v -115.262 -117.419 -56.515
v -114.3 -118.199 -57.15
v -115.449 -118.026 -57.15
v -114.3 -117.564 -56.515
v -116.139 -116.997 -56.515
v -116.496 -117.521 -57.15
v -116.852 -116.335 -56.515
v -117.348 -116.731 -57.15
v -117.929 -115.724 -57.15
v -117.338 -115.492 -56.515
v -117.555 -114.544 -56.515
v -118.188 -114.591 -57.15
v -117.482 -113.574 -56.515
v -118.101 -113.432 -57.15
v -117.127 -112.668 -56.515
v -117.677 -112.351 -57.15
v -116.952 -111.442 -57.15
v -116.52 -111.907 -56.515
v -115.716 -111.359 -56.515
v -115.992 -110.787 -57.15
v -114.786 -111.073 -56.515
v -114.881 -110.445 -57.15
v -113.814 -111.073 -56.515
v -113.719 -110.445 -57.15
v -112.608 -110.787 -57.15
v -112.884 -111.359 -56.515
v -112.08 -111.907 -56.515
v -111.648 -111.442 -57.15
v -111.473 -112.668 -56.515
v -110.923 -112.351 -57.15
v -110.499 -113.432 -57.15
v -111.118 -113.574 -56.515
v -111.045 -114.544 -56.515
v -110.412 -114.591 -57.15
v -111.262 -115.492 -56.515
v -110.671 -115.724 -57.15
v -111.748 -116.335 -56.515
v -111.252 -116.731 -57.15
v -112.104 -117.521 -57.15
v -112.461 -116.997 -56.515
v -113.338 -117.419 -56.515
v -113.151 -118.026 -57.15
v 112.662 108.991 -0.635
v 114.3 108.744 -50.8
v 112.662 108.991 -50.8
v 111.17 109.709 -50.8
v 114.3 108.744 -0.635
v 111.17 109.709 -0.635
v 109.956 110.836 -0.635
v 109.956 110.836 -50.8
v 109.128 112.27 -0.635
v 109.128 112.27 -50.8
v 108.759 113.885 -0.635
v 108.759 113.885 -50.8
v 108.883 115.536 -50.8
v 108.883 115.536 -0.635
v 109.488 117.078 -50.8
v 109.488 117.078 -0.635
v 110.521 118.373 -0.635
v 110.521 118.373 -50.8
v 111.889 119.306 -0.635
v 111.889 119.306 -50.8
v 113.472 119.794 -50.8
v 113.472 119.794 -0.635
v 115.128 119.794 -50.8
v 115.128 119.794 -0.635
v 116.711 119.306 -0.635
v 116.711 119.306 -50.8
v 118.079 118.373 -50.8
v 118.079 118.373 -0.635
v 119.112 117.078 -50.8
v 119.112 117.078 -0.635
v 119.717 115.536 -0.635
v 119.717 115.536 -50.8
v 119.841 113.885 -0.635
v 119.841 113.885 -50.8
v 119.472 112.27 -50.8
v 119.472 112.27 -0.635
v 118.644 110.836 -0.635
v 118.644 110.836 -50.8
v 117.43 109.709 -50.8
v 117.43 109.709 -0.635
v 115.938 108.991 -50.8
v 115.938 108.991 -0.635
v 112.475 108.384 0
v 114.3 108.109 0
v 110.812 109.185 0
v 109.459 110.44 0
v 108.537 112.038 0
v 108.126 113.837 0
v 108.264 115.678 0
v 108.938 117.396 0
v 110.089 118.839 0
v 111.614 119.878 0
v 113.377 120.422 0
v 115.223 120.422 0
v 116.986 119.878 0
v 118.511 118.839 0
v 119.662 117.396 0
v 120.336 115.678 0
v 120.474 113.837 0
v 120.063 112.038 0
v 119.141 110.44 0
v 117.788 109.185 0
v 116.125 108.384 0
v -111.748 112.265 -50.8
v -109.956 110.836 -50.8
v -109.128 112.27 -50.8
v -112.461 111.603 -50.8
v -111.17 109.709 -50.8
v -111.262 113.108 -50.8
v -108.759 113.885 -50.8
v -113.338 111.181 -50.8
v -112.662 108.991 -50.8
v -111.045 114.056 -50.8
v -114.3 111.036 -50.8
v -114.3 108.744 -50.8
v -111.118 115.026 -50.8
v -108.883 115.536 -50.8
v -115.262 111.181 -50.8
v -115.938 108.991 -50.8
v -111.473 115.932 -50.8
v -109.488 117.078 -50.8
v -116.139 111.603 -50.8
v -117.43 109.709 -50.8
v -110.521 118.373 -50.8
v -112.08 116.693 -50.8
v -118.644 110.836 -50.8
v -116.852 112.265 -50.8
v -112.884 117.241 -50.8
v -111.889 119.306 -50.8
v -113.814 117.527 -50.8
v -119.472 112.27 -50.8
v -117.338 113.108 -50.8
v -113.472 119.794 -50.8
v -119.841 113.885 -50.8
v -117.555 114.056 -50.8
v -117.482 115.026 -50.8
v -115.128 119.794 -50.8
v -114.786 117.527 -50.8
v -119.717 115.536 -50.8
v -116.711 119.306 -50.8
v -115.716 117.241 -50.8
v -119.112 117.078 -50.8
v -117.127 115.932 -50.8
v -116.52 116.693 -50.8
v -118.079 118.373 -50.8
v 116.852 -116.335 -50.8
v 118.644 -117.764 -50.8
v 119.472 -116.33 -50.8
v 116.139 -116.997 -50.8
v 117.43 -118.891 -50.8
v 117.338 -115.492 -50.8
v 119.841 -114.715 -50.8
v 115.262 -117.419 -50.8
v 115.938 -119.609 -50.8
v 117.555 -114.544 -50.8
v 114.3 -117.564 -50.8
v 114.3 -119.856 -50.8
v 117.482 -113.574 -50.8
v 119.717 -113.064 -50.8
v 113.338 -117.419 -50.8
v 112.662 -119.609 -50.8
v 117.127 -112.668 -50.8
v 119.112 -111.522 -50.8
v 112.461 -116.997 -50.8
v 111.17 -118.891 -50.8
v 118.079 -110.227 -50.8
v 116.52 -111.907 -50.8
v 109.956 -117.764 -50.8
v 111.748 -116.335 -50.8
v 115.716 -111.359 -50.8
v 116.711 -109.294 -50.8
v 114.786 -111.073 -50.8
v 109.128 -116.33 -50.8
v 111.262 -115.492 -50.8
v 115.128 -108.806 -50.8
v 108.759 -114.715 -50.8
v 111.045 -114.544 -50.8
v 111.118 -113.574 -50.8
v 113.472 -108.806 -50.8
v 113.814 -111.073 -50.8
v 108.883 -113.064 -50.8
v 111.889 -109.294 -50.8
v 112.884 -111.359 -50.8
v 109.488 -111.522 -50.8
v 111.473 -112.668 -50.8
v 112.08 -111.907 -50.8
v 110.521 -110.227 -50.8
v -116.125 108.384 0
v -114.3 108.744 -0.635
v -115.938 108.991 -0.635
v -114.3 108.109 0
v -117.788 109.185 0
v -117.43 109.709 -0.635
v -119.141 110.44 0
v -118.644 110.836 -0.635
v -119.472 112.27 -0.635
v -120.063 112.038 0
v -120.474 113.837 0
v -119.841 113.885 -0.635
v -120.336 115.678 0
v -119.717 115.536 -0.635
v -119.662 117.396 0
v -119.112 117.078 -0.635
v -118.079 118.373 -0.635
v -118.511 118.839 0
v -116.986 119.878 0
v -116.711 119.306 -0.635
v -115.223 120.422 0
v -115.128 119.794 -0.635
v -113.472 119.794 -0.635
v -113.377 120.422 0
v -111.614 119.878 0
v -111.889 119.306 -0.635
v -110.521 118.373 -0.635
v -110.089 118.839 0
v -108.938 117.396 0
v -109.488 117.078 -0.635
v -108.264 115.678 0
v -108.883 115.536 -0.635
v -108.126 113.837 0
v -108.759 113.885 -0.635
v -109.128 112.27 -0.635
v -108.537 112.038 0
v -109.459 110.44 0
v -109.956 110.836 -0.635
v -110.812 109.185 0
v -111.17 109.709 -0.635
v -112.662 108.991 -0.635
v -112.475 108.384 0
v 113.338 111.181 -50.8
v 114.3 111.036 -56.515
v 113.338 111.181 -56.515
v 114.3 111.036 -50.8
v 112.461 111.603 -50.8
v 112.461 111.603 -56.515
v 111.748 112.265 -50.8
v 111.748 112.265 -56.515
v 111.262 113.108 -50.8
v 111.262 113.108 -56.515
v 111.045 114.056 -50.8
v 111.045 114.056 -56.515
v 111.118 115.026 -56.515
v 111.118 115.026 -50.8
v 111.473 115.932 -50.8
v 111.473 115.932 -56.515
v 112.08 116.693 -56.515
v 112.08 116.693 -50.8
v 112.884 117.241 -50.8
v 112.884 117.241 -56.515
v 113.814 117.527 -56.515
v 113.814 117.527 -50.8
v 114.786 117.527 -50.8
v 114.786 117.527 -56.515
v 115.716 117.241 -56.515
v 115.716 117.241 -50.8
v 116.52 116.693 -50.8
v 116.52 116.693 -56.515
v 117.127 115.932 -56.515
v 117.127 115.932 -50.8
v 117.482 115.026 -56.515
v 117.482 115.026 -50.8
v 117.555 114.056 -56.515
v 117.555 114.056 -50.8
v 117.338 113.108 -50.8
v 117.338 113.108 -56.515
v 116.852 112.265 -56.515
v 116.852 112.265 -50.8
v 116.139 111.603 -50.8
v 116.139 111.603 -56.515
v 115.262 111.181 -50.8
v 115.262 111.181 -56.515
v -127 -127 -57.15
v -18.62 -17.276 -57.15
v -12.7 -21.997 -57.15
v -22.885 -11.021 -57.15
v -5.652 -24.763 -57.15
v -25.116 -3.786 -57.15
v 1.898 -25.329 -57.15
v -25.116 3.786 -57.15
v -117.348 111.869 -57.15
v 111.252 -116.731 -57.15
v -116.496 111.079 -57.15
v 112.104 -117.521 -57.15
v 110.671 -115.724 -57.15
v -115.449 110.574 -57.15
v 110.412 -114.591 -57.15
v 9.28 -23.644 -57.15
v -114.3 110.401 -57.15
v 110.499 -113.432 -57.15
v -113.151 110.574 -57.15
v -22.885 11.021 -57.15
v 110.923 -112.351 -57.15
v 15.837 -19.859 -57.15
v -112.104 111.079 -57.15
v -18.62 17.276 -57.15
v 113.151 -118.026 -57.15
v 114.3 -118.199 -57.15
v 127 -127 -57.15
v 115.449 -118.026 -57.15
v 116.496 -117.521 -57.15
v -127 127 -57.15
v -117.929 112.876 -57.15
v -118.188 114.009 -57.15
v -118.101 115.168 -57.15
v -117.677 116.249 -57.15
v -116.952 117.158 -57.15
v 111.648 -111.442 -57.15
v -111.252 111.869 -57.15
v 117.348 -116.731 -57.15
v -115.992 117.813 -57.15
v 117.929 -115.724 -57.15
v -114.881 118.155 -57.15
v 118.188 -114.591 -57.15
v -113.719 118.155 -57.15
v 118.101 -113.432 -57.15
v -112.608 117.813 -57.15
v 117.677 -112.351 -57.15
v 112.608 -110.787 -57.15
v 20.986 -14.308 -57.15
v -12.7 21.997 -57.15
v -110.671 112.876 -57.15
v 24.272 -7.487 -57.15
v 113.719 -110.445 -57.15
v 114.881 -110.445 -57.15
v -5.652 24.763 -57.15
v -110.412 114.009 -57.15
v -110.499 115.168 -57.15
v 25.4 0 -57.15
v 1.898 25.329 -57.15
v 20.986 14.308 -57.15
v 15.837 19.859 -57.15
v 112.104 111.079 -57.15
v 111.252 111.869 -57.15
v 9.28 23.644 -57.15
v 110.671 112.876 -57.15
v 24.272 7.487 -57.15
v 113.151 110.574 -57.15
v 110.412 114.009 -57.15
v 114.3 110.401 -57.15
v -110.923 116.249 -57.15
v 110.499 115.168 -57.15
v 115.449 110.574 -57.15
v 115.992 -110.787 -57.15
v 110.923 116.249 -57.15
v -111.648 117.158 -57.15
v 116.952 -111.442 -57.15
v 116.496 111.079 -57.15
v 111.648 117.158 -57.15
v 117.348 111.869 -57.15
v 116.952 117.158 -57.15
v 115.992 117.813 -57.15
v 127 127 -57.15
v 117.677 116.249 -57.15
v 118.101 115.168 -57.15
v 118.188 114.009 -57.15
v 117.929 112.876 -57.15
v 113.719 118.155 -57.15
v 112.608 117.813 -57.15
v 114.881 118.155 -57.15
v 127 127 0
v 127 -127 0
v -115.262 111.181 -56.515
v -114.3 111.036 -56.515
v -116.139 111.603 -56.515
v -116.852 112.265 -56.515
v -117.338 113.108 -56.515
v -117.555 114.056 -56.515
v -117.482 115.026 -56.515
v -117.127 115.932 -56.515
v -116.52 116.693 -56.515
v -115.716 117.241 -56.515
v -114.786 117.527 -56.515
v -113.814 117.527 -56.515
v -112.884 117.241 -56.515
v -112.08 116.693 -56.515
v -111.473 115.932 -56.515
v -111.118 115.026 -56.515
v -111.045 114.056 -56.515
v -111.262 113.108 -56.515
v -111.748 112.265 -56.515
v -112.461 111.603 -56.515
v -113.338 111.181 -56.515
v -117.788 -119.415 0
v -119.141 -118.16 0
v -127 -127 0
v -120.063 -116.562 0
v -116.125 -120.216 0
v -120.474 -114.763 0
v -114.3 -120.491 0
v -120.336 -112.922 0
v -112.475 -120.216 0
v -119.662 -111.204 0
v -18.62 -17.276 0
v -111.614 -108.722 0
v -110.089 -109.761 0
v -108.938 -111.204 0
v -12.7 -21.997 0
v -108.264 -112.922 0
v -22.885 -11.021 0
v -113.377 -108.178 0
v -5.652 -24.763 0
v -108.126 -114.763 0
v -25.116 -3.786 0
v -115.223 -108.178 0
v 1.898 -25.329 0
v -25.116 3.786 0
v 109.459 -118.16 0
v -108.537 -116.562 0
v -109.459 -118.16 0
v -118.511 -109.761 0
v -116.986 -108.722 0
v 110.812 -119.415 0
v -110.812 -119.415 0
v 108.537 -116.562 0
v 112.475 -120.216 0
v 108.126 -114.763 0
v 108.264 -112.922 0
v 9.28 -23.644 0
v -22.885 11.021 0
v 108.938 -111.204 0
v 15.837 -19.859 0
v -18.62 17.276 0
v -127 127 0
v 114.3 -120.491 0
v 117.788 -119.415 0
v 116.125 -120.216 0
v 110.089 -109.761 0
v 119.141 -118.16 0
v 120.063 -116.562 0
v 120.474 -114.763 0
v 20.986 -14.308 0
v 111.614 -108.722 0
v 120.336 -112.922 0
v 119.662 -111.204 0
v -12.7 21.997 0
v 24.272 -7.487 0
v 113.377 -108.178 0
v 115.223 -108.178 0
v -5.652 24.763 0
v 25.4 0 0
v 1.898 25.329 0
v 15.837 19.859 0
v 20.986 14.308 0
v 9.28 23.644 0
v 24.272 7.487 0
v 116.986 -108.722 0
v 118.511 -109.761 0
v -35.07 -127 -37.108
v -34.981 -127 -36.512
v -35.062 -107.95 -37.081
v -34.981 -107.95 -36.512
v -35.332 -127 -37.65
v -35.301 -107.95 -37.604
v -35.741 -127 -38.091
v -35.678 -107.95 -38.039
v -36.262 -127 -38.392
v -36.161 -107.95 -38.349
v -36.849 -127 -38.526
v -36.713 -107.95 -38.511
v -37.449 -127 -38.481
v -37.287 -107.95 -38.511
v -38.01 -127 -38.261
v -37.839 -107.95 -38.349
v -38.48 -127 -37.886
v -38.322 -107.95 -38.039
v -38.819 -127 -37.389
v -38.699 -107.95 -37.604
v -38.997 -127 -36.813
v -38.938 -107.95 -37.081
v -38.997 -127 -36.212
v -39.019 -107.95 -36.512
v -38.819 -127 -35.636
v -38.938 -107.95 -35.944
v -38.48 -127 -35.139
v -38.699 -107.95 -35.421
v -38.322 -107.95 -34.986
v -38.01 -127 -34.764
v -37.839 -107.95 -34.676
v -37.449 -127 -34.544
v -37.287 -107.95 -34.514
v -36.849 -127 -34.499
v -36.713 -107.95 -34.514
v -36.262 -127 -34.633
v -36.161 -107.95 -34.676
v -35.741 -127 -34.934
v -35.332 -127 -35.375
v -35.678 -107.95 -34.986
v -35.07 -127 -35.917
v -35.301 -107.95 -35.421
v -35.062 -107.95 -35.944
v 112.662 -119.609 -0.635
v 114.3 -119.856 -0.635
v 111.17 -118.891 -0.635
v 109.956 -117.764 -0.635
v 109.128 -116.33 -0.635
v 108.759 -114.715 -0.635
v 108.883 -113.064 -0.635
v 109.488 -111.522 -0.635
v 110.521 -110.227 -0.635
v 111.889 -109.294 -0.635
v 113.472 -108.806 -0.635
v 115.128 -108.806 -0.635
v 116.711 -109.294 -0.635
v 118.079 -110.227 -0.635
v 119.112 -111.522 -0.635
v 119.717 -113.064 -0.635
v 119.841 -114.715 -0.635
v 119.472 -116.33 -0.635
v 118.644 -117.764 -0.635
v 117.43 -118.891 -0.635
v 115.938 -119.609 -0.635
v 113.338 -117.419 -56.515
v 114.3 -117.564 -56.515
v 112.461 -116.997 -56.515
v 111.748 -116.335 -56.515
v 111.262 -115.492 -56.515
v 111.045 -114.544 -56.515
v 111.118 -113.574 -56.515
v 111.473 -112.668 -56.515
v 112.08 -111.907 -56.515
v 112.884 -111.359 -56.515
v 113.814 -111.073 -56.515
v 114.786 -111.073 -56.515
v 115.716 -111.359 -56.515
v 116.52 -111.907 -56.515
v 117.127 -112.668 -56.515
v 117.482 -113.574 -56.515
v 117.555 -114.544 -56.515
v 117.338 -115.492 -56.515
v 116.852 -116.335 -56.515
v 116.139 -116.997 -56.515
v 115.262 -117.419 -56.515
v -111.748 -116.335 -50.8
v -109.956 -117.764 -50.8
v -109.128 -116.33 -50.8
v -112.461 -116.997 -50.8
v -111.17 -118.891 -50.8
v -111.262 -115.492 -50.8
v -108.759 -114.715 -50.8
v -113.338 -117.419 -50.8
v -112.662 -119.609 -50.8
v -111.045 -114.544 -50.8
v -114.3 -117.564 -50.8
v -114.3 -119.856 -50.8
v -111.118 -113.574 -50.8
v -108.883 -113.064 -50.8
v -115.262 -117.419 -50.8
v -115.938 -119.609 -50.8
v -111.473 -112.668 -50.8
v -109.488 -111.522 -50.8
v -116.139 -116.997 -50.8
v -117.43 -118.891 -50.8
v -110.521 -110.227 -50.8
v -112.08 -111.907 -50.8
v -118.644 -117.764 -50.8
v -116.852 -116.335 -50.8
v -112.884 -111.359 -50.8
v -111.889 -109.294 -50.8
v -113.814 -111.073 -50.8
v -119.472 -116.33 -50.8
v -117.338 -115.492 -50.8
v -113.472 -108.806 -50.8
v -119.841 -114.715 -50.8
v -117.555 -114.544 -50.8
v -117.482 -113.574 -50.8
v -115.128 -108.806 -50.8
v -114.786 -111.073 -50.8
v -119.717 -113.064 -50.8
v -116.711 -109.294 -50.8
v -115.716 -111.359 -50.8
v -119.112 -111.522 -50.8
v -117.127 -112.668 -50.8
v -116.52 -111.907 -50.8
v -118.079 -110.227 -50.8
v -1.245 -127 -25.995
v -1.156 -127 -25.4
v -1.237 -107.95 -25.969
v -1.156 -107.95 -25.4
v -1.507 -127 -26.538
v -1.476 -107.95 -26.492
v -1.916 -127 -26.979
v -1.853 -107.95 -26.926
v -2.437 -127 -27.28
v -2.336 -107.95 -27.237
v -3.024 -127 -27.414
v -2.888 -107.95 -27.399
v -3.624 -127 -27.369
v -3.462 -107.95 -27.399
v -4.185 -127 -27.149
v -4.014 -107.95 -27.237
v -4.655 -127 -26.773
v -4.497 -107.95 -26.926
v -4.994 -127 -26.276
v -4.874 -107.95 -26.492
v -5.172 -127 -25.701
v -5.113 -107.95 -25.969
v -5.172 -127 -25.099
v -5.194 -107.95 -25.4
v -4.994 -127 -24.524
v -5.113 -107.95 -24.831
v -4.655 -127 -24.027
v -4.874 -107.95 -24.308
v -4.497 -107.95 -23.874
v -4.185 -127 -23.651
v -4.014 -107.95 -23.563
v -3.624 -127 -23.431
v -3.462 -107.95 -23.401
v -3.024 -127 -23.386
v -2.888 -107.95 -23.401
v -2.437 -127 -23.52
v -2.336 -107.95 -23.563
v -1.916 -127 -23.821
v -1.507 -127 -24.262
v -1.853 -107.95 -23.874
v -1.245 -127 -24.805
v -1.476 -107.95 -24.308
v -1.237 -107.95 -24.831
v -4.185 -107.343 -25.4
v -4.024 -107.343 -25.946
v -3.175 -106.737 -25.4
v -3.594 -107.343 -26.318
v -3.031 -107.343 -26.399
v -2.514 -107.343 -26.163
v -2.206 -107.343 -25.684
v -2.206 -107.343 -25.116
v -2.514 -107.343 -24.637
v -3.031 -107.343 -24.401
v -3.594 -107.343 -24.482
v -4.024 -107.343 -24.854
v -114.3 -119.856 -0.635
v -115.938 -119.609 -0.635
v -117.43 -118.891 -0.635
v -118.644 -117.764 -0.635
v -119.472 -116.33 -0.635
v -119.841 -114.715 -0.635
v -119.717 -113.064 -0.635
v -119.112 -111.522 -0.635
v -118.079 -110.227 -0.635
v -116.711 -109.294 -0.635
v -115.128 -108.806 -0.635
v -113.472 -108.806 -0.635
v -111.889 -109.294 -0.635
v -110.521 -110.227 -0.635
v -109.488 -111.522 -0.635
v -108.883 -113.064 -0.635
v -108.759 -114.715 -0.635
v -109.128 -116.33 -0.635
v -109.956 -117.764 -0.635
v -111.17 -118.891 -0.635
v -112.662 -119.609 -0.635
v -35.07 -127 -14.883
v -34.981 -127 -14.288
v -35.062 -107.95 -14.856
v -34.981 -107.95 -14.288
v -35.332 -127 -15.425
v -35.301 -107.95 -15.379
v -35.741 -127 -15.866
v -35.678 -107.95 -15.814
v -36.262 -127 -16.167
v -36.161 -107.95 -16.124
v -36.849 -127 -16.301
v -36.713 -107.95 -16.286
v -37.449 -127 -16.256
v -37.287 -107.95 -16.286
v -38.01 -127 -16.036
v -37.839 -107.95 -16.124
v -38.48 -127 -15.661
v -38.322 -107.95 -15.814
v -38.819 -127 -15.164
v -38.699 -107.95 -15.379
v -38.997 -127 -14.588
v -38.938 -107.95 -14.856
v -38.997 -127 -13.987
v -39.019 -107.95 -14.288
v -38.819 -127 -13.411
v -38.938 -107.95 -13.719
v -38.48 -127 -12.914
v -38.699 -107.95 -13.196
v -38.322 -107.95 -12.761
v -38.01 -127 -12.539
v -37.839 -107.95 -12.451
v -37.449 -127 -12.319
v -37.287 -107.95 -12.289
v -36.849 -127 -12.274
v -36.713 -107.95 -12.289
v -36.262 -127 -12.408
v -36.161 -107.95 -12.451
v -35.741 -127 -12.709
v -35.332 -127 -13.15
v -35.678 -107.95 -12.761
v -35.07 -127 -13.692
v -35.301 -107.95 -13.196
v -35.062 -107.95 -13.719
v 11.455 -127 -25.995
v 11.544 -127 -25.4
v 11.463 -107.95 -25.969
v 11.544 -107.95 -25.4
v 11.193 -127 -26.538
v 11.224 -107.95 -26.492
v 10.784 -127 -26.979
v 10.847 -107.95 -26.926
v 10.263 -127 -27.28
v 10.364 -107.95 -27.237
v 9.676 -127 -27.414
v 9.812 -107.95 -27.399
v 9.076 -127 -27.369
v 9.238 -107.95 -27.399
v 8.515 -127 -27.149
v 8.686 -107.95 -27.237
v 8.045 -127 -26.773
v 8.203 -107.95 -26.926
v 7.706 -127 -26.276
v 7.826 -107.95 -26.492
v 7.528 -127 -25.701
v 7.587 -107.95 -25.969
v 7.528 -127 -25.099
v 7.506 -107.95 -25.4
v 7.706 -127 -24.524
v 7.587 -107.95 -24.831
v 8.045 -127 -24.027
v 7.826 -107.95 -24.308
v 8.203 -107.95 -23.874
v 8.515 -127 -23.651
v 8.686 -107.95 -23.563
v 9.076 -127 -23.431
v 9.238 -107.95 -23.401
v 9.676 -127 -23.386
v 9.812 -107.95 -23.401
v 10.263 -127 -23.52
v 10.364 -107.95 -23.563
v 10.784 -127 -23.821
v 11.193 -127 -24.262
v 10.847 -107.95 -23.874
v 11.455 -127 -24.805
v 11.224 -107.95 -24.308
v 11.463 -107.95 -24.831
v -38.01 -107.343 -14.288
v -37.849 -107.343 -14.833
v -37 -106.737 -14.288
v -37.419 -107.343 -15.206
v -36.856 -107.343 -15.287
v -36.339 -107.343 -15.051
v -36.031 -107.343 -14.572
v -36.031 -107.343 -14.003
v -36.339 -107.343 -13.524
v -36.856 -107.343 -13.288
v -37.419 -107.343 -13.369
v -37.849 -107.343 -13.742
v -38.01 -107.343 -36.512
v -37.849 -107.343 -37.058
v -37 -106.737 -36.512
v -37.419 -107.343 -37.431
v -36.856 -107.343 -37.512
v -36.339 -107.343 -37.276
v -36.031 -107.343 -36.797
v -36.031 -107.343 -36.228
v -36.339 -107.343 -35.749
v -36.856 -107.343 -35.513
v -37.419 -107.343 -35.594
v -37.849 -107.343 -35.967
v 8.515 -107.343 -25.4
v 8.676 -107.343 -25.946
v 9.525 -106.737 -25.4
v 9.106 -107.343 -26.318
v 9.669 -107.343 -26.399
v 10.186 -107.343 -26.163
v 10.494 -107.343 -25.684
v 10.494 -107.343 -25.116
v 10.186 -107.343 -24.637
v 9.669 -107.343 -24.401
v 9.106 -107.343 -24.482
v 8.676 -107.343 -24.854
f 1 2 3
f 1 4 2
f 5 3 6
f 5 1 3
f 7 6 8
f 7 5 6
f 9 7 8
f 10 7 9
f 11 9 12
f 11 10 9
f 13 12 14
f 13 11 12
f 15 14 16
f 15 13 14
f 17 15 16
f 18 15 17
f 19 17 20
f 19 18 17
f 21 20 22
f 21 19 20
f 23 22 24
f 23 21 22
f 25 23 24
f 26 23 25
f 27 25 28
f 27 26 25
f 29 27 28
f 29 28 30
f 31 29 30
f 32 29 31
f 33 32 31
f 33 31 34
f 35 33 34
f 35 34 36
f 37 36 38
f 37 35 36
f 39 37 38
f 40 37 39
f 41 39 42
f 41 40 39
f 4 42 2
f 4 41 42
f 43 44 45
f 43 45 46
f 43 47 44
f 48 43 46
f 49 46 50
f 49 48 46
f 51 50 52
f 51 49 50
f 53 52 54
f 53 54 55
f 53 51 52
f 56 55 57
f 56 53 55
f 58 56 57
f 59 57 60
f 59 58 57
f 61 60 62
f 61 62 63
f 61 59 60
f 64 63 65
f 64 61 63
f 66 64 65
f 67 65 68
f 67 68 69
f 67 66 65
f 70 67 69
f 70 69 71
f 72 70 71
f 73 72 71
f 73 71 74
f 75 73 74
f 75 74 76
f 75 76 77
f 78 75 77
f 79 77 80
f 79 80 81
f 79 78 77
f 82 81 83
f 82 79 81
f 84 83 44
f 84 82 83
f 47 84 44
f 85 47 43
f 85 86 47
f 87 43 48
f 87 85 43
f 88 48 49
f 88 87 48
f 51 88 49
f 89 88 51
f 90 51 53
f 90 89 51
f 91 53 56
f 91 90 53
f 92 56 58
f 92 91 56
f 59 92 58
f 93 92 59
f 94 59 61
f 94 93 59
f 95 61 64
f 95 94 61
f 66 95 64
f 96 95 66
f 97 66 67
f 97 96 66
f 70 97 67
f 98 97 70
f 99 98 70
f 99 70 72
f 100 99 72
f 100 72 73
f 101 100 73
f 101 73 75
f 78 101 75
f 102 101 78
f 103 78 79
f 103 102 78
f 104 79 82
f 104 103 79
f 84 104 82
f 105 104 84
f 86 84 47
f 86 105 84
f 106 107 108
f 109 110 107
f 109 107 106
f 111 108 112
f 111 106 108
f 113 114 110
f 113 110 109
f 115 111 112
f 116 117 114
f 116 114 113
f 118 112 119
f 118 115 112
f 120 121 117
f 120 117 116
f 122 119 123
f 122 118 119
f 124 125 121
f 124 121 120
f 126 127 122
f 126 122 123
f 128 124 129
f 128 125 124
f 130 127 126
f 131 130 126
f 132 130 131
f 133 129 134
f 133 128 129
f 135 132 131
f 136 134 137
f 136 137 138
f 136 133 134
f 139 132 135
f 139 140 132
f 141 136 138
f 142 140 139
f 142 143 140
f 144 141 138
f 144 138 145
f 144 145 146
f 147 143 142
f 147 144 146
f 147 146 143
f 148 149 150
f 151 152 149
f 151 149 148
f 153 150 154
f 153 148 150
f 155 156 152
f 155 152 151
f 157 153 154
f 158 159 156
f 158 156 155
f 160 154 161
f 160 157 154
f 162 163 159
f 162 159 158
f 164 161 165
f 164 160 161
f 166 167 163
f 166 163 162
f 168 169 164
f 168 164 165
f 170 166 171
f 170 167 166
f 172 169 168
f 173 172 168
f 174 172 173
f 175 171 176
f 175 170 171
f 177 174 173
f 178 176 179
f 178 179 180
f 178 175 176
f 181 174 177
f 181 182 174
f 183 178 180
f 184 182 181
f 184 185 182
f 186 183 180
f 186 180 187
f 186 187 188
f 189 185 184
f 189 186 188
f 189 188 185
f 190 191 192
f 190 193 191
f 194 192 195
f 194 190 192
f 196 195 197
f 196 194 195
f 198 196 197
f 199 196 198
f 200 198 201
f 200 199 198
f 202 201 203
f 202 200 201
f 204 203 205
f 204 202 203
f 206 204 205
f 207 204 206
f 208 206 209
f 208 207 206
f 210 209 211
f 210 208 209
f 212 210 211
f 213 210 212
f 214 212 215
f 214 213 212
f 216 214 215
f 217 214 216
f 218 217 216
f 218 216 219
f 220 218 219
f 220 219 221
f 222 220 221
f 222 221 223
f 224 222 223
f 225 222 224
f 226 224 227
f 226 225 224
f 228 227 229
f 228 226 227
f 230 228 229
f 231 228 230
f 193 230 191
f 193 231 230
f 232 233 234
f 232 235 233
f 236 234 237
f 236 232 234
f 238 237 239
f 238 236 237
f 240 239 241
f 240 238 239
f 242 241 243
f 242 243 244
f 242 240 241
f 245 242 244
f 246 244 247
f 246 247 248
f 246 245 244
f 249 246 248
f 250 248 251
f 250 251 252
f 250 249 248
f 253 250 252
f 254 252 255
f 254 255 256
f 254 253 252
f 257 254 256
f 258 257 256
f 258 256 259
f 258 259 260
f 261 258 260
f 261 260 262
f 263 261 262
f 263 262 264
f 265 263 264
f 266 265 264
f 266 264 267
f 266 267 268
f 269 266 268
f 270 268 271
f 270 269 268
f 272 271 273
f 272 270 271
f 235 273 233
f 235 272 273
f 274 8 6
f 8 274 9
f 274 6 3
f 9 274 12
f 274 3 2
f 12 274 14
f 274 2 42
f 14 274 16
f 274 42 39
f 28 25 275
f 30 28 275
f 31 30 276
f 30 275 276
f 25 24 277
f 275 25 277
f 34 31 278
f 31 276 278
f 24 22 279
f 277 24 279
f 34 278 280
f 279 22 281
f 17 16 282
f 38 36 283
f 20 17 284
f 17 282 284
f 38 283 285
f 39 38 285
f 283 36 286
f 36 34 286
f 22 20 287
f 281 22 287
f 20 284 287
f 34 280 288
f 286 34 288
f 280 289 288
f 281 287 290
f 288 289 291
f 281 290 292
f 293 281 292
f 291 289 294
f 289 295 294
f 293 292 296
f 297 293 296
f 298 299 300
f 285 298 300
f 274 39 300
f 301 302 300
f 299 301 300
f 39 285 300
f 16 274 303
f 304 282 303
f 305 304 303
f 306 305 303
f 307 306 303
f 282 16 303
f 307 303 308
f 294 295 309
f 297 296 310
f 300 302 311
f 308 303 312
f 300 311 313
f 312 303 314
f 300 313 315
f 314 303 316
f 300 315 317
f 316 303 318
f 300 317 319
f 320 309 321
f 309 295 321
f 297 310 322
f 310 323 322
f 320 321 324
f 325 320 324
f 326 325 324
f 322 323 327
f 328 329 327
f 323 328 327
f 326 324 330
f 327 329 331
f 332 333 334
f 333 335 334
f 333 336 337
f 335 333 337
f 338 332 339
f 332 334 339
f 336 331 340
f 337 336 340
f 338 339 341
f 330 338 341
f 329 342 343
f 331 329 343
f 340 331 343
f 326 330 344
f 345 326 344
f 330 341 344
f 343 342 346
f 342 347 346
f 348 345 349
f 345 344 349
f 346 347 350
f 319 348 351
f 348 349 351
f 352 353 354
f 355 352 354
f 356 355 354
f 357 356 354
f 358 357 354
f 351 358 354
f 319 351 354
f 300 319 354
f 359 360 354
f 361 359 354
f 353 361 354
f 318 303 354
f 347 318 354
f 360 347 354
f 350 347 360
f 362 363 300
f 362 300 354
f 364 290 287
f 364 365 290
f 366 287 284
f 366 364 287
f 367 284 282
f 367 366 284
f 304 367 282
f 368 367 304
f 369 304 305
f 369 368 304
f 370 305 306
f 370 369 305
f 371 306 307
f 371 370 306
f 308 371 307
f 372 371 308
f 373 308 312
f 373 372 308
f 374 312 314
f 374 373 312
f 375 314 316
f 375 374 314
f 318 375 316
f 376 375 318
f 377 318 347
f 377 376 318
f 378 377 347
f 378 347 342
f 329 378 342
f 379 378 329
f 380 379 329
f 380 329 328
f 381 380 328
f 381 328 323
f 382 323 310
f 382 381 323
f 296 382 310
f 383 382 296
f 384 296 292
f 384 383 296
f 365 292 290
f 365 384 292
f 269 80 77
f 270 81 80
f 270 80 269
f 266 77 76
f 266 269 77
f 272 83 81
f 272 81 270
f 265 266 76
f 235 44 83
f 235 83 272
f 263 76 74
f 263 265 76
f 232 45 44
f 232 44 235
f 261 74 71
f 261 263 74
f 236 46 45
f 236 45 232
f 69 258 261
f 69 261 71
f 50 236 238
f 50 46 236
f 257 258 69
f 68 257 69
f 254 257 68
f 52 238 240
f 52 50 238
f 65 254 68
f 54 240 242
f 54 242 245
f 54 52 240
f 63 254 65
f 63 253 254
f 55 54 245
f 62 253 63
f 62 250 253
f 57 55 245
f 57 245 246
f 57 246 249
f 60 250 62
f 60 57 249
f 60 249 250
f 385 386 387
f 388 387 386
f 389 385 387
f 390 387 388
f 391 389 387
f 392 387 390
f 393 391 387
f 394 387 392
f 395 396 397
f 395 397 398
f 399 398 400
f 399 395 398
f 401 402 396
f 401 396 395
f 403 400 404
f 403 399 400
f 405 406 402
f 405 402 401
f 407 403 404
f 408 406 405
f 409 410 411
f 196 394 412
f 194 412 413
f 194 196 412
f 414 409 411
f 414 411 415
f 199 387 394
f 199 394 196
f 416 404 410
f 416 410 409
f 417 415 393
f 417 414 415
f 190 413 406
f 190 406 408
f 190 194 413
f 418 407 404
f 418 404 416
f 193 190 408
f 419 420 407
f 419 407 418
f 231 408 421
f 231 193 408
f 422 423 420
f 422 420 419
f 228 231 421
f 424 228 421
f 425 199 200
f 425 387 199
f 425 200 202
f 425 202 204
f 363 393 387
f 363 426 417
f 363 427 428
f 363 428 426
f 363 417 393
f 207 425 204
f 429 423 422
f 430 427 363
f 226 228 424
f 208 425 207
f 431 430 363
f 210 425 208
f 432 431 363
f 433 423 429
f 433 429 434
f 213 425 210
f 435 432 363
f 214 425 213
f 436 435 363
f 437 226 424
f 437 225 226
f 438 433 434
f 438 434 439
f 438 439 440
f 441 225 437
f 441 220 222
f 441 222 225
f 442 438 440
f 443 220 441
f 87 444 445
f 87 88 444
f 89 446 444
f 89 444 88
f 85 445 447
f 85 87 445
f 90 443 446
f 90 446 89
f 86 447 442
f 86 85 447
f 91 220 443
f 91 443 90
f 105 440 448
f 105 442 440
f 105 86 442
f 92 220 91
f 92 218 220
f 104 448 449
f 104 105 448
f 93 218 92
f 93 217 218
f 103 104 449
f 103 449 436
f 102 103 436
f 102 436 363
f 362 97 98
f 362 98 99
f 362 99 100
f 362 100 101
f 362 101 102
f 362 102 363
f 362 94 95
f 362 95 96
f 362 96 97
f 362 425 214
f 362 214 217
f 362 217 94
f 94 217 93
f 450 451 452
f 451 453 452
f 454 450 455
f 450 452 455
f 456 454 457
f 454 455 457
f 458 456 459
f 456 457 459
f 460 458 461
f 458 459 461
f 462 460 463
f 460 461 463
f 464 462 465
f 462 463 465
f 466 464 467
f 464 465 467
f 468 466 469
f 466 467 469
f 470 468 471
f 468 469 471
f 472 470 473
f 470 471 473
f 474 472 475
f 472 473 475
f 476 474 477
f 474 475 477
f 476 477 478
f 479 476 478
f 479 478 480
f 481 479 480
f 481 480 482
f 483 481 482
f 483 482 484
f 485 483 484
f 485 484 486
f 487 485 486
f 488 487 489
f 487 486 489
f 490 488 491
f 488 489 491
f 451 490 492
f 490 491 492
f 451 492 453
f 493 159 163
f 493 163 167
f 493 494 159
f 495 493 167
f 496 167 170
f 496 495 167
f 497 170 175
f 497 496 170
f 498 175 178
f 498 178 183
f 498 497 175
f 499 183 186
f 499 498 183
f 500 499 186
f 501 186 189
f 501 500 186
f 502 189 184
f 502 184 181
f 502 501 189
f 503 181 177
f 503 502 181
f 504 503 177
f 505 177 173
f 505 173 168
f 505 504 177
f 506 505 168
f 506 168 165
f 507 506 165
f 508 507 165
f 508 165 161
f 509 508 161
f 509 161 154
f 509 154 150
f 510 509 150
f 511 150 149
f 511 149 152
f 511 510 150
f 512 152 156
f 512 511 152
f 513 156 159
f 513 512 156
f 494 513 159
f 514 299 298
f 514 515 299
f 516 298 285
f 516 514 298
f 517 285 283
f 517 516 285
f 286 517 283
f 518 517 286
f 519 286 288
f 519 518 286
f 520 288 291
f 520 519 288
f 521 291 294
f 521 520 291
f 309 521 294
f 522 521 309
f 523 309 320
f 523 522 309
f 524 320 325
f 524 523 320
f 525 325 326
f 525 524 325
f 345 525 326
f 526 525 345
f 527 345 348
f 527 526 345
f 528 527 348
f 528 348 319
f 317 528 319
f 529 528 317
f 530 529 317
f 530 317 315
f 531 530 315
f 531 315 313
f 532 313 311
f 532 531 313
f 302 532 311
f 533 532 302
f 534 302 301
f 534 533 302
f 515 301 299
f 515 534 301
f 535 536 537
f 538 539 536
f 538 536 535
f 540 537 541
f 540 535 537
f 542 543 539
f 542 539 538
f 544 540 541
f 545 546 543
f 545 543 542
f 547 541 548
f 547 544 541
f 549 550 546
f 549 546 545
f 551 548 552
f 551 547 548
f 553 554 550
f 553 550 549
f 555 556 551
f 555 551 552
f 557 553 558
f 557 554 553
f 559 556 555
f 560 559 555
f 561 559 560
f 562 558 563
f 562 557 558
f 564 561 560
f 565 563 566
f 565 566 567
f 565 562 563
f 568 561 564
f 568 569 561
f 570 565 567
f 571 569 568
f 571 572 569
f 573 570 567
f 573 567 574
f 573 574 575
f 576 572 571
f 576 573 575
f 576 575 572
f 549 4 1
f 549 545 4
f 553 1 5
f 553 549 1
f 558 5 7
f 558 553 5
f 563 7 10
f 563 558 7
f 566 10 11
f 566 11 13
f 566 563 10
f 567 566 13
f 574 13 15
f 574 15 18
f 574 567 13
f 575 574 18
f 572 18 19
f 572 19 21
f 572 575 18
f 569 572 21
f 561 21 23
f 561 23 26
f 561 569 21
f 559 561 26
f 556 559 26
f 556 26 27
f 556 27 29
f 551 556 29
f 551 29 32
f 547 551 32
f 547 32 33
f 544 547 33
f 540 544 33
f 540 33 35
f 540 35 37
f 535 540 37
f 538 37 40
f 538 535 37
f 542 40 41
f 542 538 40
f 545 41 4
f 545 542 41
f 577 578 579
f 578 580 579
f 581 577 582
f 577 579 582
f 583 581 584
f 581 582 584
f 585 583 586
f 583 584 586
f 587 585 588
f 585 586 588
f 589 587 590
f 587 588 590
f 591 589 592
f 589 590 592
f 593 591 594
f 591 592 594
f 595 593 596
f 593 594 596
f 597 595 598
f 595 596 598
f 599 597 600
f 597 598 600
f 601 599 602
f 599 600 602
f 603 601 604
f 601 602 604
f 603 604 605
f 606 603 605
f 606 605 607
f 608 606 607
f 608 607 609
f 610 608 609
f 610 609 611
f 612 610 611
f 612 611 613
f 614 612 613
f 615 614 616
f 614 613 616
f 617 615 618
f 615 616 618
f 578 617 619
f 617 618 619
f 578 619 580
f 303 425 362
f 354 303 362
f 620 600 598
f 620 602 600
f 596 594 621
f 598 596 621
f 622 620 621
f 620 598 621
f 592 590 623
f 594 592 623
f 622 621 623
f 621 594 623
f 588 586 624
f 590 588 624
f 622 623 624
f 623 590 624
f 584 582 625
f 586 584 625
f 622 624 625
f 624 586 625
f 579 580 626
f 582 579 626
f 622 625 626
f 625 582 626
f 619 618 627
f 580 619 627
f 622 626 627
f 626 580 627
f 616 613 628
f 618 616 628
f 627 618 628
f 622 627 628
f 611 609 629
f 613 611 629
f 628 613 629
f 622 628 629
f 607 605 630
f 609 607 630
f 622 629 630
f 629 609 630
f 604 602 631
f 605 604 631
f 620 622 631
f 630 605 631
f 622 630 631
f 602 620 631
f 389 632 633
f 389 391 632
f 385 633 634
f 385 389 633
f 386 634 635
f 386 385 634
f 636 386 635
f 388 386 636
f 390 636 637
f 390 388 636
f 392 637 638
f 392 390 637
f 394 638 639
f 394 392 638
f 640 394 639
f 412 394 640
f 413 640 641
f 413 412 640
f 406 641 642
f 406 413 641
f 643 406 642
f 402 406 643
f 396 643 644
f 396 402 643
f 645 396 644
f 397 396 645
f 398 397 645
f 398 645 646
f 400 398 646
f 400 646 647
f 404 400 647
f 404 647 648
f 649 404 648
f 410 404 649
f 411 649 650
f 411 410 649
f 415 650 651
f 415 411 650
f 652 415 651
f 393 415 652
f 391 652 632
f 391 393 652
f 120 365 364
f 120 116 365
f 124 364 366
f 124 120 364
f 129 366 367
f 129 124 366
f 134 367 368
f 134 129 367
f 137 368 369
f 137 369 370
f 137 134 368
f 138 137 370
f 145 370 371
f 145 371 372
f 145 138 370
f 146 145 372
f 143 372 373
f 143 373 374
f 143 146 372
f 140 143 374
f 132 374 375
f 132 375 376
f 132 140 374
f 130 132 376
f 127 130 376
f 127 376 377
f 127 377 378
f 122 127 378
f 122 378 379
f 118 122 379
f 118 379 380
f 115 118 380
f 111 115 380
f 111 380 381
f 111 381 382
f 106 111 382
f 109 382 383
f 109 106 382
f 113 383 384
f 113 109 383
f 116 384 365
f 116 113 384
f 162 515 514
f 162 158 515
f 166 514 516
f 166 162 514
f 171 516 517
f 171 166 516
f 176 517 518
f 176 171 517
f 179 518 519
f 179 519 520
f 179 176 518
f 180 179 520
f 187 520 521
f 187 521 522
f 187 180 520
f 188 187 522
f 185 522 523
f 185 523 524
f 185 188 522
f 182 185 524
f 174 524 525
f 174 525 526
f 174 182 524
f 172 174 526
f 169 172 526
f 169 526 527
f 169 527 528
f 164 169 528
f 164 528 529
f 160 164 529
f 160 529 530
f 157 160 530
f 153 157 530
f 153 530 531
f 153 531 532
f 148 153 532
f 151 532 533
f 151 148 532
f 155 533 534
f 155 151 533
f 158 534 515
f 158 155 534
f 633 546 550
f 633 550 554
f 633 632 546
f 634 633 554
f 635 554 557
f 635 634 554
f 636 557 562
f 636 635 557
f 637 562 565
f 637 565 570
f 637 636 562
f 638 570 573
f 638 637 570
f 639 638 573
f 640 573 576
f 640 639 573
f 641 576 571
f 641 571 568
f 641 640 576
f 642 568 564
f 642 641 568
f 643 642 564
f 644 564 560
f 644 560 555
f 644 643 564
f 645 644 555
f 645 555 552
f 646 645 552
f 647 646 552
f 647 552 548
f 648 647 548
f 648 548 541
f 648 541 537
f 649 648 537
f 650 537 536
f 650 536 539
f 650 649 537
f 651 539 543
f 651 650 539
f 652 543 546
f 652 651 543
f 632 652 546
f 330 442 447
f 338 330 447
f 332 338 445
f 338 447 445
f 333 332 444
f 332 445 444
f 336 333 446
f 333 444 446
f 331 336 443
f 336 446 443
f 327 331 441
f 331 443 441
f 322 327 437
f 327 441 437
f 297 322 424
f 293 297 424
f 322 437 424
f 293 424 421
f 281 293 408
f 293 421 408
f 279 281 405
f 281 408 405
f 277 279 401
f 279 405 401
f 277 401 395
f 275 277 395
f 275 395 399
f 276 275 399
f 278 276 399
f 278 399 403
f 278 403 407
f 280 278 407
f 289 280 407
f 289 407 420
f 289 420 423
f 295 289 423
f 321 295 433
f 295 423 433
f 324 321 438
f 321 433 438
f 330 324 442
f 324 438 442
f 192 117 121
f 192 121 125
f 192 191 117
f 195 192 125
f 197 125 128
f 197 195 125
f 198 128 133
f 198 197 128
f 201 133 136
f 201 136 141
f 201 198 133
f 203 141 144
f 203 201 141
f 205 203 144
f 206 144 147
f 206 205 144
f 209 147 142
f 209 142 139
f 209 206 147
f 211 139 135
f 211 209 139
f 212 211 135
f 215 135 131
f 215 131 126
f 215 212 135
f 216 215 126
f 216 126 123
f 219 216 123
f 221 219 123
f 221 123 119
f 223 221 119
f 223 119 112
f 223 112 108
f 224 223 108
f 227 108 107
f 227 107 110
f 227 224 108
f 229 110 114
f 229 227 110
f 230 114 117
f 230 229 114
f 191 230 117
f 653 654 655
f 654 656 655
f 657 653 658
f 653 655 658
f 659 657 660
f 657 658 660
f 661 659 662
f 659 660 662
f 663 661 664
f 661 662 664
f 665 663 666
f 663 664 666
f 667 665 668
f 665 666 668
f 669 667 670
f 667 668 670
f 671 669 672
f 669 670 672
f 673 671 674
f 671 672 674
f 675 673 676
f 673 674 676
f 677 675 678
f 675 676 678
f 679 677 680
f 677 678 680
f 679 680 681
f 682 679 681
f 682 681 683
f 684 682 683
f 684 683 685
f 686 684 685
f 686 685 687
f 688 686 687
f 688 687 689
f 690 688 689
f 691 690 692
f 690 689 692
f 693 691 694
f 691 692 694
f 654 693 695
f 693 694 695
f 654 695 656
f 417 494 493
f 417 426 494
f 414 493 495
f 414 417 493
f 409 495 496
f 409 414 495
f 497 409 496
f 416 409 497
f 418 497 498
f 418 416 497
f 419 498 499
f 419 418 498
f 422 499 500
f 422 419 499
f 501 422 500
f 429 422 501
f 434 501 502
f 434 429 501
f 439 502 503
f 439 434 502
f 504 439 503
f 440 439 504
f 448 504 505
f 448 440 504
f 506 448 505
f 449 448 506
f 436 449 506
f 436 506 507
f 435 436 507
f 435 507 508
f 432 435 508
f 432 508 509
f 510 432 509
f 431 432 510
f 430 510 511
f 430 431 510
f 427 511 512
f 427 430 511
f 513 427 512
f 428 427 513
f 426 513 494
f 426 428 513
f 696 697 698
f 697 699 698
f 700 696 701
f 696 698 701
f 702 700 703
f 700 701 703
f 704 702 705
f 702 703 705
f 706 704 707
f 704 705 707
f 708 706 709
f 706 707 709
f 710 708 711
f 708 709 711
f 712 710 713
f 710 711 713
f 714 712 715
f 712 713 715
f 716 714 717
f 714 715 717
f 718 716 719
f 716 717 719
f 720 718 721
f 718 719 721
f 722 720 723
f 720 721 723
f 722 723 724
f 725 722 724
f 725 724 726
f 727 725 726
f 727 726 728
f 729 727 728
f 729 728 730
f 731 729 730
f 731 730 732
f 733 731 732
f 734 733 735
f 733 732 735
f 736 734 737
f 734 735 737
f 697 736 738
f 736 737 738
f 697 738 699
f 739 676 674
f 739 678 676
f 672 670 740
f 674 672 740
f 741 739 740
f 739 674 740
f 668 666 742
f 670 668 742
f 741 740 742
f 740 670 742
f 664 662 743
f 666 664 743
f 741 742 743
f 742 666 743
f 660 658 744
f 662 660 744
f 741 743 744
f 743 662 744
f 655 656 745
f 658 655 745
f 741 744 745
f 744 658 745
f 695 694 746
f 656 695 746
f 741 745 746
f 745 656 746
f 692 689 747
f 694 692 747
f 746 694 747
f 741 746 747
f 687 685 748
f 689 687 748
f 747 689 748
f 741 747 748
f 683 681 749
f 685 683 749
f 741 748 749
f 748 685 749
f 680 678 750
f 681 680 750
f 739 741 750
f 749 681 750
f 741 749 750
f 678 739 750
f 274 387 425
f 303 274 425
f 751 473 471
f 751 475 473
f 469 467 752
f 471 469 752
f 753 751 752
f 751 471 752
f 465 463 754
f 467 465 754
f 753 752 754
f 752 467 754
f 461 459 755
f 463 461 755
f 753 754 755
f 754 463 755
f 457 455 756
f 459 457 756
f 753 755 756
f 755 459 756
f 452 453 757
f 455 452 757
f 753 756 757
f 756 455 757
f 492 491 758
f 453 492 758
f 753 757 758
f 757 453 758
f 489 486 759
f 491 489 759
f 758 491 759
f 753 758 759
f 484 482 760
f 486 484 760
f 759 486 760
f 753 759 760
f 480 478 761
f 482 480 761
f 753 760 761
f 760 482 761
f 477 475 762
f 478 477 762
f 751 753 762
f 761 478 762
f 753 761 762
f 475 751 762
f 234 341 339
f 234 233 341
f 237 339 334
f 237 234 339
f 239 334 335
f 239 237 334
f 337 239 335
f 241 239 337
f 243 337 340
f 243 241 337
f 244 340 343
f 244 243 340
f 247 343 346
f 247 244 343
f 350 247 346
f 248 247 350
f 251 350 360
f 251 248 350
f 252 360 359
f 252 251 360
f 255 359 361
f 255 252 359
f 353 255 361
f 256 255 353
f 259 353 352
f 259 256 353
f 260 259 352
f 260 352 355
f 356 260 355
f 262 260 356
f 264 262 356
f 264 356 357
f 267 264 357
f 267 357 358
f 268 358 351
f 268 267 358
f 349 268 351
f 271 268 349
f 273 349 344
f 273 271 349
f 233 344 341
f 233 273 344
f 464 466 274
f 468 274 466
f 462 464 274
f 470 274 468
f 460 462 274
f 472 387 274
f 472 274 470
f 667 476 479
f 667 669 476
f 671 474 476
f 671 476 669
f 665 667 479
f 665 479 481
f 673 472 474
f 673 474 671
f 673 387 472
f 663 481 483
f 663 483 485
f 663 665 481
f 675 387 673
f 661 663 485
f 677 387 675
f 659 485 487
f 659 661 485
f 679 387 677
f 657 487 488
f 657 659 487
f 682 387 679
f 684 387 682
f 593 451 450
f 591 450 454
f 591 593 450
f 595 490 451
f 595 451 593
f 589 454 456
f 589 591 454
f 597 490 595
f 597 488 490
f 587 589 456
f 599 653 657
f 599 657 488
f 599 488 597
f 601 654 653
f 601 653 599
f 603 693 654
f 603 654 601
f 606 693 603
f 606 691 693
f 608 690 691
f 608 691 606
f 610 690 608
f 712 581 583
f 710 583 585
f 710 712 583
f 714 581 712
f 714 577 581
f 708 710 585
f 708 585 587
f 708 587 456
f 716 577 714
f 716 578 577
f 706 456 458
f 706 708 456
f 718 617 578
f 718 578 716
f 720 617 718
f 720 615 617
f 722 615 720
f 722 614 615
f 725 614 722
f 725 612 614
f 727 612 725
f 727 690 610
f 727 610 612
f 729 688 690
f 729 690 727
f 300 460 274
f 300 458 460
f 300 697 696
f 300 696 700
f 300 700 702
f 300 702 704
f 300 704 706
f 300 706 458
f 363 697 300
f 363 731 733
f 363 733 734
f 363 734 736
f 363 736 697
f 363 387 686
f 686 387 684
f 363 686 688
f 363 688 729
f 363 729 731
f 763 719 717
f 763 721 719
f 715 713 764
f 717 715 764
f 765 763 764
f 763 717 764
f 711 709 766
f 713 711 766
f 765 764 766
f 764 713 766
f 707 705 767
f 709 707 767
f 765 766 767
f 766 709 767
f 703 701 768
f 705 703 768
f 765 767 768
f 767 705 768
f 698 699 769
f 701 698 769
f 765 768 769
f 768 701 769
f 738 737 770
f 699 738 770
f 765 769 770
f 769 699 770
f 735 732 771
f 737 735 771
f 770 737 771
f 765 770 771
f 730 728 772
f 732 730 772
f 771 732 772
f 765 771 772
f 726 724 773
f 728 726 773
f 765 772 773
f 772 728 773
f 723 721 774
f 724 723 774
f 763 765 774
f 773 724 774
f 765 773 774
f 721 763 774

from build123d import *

# Parameters (mm, degrees)
SKETCH1_W                                     = 254
SKETCH1_H                                     = 254
SKETCH1_R                                     = 25.4
BOSS_EXTRUDE1_DEPTH                           = 57.15
CBORE_FOR_1_4_SOCKET_HEAD_CAP_SCREW2_AT_COUNT = 2
CBORE_FOR_1_4_SOCKET_HEAD_CAP_SCREW2_AT_PITCH = 228.6
CBORE_FOR_1_4_SOCKET_HEAD_CAP_SCREW2_2_COUNT  = 2
CBORE_FOR_1_4_SOCKET_HEAD_CAP_SCREW2_2_PITCH  = 323.289220358
CBORE_FOR_1_4_SOCKET_HEAD_CAP_SCREW2_3_COUNT  = 2
CBORE_FOR_1_4_SOCKET_HEAD_CAP_SCREW2_3_PITCH  = 228.6
F_10_32_TAPPED_HOLE1_D                        = 4.0386
F_10_32_TAPPED_HOLE1_DEPTH                    = 19.05
F_10_32_TAPPED_HOLE1_TIP                      = 1.213317848


with BuildPart() as part:
    # Sketch1 → Boss-Extrude1 (new body)
    with BuildSketch(Plane.XY):
        Rectangle(SKETCH1_W, SKETCH1_H)
        Circle(SKETCH1_R, mode=Mode.SUBTRACT)
    extrude(amount=-BOSS_EXTRUDE1_DEPTH)

    # Sketch3 → CBORE for 1/4 Socket Head Cap Screw2 (revolve, cut)
    with BuildSketch(Plane(origin=(-114.3, 114.3, 0), x_dir=(0, -1, 0), z_dir=(1, 0, 0))):
        Polygon((0, 0), (0, 57.15), (3.8989, 57.15), (3.2639, 56.515), (3.2639, 50.8), (5.55625, 50.8), (5.55625, 0.635), (6.19125, 0), align=None)
    cbore_for_1_4_socket_head_cap_screw2 = revolve(axis=Axis((-114.3, 114.3, 6.35), (0, 0, -1)), mode=Mode.SUBTRACT)

    # CBORE for 1/4 Socket Head Cap Screw2 at: CBORE for 1/4 Socket Head Cap Screw2 ×2
    with Locations(*[(i * CBORE_FOR_1_4_SOCKET_HEAD_CAP_SCREW2_AT_PITCH, 0, 0) for i in range(1, CBORE_FOR_1_4_SOCKET_HEAD_CAP_SCREW2_AT_COUNT)]):
        add(cbore_for_1_4_socket_head_cap_screw2, mode=Mode.SUBTRACT)

    # CBORE for 1_4 Socket Head Cap Screw2 2: CBORE for 1/4 Socket Head Cap Screw2 ×2
    with Locations(*[Vector(0.707106781, -0.707106781, 0) * (i * CBORE_FOR_1_4_SOCKET_HEAD_CAP_SCREW2_2_PITCH) for i in range(1, CBORE_FOR_1_4_SOCKET_HEAD_CAP_SCREW2_2_COUNT)]):
        add(cbore_for_1_4_socket_head_cap_screw2, mode=Mode.SUBTRACT)

    # CBORE for 1_4 Socket Head Cap Screw2 3: CBORE for 1/4 Socket Head Cap Screw2 ×2
    with Locations(*[(0, -i * CBORE_FOR_1_4_SOCKET_HEAD_CAP_SCREW2_3_PITCH, 0) for i in range(1, CBORE_FOR_1_4_SOCKET_HEAD_CAP_SCREW2_3_COUNT)]):
        add(cbore_for_1_4_socket_head_cap_screw2, mode=Mode.SUBTRACT)

    # #10-32 Tapped Hole1
    with Locations(Plane(origin=(0, -127, 0), x_dir=(-1, 0, 0), z_dir=(0, -1, 0))):
        with Locations((3.175, 25.4), (-9.525, 25.4), (37, 14.2875), (37, 36.5125)):
            Hole(F_10_32_TAPPED_HOLE1_D / 2, depth=F_10_32_TAPPED_HOLE1_DEPTH)
            with Locations((0, 0, -(F_10_32_TAPPED_HOLE1_DEPTH + F_10_32_TAPPED_HOLE1_TIP / 2))):  # 118° drill point
                Cone(0, F_10_32_TAPPED_HOLE1_D / 2, F_10_32_TAPPED_HOLE1_TIP, mode=Mode.SUBTRACT)


solid = part.part
